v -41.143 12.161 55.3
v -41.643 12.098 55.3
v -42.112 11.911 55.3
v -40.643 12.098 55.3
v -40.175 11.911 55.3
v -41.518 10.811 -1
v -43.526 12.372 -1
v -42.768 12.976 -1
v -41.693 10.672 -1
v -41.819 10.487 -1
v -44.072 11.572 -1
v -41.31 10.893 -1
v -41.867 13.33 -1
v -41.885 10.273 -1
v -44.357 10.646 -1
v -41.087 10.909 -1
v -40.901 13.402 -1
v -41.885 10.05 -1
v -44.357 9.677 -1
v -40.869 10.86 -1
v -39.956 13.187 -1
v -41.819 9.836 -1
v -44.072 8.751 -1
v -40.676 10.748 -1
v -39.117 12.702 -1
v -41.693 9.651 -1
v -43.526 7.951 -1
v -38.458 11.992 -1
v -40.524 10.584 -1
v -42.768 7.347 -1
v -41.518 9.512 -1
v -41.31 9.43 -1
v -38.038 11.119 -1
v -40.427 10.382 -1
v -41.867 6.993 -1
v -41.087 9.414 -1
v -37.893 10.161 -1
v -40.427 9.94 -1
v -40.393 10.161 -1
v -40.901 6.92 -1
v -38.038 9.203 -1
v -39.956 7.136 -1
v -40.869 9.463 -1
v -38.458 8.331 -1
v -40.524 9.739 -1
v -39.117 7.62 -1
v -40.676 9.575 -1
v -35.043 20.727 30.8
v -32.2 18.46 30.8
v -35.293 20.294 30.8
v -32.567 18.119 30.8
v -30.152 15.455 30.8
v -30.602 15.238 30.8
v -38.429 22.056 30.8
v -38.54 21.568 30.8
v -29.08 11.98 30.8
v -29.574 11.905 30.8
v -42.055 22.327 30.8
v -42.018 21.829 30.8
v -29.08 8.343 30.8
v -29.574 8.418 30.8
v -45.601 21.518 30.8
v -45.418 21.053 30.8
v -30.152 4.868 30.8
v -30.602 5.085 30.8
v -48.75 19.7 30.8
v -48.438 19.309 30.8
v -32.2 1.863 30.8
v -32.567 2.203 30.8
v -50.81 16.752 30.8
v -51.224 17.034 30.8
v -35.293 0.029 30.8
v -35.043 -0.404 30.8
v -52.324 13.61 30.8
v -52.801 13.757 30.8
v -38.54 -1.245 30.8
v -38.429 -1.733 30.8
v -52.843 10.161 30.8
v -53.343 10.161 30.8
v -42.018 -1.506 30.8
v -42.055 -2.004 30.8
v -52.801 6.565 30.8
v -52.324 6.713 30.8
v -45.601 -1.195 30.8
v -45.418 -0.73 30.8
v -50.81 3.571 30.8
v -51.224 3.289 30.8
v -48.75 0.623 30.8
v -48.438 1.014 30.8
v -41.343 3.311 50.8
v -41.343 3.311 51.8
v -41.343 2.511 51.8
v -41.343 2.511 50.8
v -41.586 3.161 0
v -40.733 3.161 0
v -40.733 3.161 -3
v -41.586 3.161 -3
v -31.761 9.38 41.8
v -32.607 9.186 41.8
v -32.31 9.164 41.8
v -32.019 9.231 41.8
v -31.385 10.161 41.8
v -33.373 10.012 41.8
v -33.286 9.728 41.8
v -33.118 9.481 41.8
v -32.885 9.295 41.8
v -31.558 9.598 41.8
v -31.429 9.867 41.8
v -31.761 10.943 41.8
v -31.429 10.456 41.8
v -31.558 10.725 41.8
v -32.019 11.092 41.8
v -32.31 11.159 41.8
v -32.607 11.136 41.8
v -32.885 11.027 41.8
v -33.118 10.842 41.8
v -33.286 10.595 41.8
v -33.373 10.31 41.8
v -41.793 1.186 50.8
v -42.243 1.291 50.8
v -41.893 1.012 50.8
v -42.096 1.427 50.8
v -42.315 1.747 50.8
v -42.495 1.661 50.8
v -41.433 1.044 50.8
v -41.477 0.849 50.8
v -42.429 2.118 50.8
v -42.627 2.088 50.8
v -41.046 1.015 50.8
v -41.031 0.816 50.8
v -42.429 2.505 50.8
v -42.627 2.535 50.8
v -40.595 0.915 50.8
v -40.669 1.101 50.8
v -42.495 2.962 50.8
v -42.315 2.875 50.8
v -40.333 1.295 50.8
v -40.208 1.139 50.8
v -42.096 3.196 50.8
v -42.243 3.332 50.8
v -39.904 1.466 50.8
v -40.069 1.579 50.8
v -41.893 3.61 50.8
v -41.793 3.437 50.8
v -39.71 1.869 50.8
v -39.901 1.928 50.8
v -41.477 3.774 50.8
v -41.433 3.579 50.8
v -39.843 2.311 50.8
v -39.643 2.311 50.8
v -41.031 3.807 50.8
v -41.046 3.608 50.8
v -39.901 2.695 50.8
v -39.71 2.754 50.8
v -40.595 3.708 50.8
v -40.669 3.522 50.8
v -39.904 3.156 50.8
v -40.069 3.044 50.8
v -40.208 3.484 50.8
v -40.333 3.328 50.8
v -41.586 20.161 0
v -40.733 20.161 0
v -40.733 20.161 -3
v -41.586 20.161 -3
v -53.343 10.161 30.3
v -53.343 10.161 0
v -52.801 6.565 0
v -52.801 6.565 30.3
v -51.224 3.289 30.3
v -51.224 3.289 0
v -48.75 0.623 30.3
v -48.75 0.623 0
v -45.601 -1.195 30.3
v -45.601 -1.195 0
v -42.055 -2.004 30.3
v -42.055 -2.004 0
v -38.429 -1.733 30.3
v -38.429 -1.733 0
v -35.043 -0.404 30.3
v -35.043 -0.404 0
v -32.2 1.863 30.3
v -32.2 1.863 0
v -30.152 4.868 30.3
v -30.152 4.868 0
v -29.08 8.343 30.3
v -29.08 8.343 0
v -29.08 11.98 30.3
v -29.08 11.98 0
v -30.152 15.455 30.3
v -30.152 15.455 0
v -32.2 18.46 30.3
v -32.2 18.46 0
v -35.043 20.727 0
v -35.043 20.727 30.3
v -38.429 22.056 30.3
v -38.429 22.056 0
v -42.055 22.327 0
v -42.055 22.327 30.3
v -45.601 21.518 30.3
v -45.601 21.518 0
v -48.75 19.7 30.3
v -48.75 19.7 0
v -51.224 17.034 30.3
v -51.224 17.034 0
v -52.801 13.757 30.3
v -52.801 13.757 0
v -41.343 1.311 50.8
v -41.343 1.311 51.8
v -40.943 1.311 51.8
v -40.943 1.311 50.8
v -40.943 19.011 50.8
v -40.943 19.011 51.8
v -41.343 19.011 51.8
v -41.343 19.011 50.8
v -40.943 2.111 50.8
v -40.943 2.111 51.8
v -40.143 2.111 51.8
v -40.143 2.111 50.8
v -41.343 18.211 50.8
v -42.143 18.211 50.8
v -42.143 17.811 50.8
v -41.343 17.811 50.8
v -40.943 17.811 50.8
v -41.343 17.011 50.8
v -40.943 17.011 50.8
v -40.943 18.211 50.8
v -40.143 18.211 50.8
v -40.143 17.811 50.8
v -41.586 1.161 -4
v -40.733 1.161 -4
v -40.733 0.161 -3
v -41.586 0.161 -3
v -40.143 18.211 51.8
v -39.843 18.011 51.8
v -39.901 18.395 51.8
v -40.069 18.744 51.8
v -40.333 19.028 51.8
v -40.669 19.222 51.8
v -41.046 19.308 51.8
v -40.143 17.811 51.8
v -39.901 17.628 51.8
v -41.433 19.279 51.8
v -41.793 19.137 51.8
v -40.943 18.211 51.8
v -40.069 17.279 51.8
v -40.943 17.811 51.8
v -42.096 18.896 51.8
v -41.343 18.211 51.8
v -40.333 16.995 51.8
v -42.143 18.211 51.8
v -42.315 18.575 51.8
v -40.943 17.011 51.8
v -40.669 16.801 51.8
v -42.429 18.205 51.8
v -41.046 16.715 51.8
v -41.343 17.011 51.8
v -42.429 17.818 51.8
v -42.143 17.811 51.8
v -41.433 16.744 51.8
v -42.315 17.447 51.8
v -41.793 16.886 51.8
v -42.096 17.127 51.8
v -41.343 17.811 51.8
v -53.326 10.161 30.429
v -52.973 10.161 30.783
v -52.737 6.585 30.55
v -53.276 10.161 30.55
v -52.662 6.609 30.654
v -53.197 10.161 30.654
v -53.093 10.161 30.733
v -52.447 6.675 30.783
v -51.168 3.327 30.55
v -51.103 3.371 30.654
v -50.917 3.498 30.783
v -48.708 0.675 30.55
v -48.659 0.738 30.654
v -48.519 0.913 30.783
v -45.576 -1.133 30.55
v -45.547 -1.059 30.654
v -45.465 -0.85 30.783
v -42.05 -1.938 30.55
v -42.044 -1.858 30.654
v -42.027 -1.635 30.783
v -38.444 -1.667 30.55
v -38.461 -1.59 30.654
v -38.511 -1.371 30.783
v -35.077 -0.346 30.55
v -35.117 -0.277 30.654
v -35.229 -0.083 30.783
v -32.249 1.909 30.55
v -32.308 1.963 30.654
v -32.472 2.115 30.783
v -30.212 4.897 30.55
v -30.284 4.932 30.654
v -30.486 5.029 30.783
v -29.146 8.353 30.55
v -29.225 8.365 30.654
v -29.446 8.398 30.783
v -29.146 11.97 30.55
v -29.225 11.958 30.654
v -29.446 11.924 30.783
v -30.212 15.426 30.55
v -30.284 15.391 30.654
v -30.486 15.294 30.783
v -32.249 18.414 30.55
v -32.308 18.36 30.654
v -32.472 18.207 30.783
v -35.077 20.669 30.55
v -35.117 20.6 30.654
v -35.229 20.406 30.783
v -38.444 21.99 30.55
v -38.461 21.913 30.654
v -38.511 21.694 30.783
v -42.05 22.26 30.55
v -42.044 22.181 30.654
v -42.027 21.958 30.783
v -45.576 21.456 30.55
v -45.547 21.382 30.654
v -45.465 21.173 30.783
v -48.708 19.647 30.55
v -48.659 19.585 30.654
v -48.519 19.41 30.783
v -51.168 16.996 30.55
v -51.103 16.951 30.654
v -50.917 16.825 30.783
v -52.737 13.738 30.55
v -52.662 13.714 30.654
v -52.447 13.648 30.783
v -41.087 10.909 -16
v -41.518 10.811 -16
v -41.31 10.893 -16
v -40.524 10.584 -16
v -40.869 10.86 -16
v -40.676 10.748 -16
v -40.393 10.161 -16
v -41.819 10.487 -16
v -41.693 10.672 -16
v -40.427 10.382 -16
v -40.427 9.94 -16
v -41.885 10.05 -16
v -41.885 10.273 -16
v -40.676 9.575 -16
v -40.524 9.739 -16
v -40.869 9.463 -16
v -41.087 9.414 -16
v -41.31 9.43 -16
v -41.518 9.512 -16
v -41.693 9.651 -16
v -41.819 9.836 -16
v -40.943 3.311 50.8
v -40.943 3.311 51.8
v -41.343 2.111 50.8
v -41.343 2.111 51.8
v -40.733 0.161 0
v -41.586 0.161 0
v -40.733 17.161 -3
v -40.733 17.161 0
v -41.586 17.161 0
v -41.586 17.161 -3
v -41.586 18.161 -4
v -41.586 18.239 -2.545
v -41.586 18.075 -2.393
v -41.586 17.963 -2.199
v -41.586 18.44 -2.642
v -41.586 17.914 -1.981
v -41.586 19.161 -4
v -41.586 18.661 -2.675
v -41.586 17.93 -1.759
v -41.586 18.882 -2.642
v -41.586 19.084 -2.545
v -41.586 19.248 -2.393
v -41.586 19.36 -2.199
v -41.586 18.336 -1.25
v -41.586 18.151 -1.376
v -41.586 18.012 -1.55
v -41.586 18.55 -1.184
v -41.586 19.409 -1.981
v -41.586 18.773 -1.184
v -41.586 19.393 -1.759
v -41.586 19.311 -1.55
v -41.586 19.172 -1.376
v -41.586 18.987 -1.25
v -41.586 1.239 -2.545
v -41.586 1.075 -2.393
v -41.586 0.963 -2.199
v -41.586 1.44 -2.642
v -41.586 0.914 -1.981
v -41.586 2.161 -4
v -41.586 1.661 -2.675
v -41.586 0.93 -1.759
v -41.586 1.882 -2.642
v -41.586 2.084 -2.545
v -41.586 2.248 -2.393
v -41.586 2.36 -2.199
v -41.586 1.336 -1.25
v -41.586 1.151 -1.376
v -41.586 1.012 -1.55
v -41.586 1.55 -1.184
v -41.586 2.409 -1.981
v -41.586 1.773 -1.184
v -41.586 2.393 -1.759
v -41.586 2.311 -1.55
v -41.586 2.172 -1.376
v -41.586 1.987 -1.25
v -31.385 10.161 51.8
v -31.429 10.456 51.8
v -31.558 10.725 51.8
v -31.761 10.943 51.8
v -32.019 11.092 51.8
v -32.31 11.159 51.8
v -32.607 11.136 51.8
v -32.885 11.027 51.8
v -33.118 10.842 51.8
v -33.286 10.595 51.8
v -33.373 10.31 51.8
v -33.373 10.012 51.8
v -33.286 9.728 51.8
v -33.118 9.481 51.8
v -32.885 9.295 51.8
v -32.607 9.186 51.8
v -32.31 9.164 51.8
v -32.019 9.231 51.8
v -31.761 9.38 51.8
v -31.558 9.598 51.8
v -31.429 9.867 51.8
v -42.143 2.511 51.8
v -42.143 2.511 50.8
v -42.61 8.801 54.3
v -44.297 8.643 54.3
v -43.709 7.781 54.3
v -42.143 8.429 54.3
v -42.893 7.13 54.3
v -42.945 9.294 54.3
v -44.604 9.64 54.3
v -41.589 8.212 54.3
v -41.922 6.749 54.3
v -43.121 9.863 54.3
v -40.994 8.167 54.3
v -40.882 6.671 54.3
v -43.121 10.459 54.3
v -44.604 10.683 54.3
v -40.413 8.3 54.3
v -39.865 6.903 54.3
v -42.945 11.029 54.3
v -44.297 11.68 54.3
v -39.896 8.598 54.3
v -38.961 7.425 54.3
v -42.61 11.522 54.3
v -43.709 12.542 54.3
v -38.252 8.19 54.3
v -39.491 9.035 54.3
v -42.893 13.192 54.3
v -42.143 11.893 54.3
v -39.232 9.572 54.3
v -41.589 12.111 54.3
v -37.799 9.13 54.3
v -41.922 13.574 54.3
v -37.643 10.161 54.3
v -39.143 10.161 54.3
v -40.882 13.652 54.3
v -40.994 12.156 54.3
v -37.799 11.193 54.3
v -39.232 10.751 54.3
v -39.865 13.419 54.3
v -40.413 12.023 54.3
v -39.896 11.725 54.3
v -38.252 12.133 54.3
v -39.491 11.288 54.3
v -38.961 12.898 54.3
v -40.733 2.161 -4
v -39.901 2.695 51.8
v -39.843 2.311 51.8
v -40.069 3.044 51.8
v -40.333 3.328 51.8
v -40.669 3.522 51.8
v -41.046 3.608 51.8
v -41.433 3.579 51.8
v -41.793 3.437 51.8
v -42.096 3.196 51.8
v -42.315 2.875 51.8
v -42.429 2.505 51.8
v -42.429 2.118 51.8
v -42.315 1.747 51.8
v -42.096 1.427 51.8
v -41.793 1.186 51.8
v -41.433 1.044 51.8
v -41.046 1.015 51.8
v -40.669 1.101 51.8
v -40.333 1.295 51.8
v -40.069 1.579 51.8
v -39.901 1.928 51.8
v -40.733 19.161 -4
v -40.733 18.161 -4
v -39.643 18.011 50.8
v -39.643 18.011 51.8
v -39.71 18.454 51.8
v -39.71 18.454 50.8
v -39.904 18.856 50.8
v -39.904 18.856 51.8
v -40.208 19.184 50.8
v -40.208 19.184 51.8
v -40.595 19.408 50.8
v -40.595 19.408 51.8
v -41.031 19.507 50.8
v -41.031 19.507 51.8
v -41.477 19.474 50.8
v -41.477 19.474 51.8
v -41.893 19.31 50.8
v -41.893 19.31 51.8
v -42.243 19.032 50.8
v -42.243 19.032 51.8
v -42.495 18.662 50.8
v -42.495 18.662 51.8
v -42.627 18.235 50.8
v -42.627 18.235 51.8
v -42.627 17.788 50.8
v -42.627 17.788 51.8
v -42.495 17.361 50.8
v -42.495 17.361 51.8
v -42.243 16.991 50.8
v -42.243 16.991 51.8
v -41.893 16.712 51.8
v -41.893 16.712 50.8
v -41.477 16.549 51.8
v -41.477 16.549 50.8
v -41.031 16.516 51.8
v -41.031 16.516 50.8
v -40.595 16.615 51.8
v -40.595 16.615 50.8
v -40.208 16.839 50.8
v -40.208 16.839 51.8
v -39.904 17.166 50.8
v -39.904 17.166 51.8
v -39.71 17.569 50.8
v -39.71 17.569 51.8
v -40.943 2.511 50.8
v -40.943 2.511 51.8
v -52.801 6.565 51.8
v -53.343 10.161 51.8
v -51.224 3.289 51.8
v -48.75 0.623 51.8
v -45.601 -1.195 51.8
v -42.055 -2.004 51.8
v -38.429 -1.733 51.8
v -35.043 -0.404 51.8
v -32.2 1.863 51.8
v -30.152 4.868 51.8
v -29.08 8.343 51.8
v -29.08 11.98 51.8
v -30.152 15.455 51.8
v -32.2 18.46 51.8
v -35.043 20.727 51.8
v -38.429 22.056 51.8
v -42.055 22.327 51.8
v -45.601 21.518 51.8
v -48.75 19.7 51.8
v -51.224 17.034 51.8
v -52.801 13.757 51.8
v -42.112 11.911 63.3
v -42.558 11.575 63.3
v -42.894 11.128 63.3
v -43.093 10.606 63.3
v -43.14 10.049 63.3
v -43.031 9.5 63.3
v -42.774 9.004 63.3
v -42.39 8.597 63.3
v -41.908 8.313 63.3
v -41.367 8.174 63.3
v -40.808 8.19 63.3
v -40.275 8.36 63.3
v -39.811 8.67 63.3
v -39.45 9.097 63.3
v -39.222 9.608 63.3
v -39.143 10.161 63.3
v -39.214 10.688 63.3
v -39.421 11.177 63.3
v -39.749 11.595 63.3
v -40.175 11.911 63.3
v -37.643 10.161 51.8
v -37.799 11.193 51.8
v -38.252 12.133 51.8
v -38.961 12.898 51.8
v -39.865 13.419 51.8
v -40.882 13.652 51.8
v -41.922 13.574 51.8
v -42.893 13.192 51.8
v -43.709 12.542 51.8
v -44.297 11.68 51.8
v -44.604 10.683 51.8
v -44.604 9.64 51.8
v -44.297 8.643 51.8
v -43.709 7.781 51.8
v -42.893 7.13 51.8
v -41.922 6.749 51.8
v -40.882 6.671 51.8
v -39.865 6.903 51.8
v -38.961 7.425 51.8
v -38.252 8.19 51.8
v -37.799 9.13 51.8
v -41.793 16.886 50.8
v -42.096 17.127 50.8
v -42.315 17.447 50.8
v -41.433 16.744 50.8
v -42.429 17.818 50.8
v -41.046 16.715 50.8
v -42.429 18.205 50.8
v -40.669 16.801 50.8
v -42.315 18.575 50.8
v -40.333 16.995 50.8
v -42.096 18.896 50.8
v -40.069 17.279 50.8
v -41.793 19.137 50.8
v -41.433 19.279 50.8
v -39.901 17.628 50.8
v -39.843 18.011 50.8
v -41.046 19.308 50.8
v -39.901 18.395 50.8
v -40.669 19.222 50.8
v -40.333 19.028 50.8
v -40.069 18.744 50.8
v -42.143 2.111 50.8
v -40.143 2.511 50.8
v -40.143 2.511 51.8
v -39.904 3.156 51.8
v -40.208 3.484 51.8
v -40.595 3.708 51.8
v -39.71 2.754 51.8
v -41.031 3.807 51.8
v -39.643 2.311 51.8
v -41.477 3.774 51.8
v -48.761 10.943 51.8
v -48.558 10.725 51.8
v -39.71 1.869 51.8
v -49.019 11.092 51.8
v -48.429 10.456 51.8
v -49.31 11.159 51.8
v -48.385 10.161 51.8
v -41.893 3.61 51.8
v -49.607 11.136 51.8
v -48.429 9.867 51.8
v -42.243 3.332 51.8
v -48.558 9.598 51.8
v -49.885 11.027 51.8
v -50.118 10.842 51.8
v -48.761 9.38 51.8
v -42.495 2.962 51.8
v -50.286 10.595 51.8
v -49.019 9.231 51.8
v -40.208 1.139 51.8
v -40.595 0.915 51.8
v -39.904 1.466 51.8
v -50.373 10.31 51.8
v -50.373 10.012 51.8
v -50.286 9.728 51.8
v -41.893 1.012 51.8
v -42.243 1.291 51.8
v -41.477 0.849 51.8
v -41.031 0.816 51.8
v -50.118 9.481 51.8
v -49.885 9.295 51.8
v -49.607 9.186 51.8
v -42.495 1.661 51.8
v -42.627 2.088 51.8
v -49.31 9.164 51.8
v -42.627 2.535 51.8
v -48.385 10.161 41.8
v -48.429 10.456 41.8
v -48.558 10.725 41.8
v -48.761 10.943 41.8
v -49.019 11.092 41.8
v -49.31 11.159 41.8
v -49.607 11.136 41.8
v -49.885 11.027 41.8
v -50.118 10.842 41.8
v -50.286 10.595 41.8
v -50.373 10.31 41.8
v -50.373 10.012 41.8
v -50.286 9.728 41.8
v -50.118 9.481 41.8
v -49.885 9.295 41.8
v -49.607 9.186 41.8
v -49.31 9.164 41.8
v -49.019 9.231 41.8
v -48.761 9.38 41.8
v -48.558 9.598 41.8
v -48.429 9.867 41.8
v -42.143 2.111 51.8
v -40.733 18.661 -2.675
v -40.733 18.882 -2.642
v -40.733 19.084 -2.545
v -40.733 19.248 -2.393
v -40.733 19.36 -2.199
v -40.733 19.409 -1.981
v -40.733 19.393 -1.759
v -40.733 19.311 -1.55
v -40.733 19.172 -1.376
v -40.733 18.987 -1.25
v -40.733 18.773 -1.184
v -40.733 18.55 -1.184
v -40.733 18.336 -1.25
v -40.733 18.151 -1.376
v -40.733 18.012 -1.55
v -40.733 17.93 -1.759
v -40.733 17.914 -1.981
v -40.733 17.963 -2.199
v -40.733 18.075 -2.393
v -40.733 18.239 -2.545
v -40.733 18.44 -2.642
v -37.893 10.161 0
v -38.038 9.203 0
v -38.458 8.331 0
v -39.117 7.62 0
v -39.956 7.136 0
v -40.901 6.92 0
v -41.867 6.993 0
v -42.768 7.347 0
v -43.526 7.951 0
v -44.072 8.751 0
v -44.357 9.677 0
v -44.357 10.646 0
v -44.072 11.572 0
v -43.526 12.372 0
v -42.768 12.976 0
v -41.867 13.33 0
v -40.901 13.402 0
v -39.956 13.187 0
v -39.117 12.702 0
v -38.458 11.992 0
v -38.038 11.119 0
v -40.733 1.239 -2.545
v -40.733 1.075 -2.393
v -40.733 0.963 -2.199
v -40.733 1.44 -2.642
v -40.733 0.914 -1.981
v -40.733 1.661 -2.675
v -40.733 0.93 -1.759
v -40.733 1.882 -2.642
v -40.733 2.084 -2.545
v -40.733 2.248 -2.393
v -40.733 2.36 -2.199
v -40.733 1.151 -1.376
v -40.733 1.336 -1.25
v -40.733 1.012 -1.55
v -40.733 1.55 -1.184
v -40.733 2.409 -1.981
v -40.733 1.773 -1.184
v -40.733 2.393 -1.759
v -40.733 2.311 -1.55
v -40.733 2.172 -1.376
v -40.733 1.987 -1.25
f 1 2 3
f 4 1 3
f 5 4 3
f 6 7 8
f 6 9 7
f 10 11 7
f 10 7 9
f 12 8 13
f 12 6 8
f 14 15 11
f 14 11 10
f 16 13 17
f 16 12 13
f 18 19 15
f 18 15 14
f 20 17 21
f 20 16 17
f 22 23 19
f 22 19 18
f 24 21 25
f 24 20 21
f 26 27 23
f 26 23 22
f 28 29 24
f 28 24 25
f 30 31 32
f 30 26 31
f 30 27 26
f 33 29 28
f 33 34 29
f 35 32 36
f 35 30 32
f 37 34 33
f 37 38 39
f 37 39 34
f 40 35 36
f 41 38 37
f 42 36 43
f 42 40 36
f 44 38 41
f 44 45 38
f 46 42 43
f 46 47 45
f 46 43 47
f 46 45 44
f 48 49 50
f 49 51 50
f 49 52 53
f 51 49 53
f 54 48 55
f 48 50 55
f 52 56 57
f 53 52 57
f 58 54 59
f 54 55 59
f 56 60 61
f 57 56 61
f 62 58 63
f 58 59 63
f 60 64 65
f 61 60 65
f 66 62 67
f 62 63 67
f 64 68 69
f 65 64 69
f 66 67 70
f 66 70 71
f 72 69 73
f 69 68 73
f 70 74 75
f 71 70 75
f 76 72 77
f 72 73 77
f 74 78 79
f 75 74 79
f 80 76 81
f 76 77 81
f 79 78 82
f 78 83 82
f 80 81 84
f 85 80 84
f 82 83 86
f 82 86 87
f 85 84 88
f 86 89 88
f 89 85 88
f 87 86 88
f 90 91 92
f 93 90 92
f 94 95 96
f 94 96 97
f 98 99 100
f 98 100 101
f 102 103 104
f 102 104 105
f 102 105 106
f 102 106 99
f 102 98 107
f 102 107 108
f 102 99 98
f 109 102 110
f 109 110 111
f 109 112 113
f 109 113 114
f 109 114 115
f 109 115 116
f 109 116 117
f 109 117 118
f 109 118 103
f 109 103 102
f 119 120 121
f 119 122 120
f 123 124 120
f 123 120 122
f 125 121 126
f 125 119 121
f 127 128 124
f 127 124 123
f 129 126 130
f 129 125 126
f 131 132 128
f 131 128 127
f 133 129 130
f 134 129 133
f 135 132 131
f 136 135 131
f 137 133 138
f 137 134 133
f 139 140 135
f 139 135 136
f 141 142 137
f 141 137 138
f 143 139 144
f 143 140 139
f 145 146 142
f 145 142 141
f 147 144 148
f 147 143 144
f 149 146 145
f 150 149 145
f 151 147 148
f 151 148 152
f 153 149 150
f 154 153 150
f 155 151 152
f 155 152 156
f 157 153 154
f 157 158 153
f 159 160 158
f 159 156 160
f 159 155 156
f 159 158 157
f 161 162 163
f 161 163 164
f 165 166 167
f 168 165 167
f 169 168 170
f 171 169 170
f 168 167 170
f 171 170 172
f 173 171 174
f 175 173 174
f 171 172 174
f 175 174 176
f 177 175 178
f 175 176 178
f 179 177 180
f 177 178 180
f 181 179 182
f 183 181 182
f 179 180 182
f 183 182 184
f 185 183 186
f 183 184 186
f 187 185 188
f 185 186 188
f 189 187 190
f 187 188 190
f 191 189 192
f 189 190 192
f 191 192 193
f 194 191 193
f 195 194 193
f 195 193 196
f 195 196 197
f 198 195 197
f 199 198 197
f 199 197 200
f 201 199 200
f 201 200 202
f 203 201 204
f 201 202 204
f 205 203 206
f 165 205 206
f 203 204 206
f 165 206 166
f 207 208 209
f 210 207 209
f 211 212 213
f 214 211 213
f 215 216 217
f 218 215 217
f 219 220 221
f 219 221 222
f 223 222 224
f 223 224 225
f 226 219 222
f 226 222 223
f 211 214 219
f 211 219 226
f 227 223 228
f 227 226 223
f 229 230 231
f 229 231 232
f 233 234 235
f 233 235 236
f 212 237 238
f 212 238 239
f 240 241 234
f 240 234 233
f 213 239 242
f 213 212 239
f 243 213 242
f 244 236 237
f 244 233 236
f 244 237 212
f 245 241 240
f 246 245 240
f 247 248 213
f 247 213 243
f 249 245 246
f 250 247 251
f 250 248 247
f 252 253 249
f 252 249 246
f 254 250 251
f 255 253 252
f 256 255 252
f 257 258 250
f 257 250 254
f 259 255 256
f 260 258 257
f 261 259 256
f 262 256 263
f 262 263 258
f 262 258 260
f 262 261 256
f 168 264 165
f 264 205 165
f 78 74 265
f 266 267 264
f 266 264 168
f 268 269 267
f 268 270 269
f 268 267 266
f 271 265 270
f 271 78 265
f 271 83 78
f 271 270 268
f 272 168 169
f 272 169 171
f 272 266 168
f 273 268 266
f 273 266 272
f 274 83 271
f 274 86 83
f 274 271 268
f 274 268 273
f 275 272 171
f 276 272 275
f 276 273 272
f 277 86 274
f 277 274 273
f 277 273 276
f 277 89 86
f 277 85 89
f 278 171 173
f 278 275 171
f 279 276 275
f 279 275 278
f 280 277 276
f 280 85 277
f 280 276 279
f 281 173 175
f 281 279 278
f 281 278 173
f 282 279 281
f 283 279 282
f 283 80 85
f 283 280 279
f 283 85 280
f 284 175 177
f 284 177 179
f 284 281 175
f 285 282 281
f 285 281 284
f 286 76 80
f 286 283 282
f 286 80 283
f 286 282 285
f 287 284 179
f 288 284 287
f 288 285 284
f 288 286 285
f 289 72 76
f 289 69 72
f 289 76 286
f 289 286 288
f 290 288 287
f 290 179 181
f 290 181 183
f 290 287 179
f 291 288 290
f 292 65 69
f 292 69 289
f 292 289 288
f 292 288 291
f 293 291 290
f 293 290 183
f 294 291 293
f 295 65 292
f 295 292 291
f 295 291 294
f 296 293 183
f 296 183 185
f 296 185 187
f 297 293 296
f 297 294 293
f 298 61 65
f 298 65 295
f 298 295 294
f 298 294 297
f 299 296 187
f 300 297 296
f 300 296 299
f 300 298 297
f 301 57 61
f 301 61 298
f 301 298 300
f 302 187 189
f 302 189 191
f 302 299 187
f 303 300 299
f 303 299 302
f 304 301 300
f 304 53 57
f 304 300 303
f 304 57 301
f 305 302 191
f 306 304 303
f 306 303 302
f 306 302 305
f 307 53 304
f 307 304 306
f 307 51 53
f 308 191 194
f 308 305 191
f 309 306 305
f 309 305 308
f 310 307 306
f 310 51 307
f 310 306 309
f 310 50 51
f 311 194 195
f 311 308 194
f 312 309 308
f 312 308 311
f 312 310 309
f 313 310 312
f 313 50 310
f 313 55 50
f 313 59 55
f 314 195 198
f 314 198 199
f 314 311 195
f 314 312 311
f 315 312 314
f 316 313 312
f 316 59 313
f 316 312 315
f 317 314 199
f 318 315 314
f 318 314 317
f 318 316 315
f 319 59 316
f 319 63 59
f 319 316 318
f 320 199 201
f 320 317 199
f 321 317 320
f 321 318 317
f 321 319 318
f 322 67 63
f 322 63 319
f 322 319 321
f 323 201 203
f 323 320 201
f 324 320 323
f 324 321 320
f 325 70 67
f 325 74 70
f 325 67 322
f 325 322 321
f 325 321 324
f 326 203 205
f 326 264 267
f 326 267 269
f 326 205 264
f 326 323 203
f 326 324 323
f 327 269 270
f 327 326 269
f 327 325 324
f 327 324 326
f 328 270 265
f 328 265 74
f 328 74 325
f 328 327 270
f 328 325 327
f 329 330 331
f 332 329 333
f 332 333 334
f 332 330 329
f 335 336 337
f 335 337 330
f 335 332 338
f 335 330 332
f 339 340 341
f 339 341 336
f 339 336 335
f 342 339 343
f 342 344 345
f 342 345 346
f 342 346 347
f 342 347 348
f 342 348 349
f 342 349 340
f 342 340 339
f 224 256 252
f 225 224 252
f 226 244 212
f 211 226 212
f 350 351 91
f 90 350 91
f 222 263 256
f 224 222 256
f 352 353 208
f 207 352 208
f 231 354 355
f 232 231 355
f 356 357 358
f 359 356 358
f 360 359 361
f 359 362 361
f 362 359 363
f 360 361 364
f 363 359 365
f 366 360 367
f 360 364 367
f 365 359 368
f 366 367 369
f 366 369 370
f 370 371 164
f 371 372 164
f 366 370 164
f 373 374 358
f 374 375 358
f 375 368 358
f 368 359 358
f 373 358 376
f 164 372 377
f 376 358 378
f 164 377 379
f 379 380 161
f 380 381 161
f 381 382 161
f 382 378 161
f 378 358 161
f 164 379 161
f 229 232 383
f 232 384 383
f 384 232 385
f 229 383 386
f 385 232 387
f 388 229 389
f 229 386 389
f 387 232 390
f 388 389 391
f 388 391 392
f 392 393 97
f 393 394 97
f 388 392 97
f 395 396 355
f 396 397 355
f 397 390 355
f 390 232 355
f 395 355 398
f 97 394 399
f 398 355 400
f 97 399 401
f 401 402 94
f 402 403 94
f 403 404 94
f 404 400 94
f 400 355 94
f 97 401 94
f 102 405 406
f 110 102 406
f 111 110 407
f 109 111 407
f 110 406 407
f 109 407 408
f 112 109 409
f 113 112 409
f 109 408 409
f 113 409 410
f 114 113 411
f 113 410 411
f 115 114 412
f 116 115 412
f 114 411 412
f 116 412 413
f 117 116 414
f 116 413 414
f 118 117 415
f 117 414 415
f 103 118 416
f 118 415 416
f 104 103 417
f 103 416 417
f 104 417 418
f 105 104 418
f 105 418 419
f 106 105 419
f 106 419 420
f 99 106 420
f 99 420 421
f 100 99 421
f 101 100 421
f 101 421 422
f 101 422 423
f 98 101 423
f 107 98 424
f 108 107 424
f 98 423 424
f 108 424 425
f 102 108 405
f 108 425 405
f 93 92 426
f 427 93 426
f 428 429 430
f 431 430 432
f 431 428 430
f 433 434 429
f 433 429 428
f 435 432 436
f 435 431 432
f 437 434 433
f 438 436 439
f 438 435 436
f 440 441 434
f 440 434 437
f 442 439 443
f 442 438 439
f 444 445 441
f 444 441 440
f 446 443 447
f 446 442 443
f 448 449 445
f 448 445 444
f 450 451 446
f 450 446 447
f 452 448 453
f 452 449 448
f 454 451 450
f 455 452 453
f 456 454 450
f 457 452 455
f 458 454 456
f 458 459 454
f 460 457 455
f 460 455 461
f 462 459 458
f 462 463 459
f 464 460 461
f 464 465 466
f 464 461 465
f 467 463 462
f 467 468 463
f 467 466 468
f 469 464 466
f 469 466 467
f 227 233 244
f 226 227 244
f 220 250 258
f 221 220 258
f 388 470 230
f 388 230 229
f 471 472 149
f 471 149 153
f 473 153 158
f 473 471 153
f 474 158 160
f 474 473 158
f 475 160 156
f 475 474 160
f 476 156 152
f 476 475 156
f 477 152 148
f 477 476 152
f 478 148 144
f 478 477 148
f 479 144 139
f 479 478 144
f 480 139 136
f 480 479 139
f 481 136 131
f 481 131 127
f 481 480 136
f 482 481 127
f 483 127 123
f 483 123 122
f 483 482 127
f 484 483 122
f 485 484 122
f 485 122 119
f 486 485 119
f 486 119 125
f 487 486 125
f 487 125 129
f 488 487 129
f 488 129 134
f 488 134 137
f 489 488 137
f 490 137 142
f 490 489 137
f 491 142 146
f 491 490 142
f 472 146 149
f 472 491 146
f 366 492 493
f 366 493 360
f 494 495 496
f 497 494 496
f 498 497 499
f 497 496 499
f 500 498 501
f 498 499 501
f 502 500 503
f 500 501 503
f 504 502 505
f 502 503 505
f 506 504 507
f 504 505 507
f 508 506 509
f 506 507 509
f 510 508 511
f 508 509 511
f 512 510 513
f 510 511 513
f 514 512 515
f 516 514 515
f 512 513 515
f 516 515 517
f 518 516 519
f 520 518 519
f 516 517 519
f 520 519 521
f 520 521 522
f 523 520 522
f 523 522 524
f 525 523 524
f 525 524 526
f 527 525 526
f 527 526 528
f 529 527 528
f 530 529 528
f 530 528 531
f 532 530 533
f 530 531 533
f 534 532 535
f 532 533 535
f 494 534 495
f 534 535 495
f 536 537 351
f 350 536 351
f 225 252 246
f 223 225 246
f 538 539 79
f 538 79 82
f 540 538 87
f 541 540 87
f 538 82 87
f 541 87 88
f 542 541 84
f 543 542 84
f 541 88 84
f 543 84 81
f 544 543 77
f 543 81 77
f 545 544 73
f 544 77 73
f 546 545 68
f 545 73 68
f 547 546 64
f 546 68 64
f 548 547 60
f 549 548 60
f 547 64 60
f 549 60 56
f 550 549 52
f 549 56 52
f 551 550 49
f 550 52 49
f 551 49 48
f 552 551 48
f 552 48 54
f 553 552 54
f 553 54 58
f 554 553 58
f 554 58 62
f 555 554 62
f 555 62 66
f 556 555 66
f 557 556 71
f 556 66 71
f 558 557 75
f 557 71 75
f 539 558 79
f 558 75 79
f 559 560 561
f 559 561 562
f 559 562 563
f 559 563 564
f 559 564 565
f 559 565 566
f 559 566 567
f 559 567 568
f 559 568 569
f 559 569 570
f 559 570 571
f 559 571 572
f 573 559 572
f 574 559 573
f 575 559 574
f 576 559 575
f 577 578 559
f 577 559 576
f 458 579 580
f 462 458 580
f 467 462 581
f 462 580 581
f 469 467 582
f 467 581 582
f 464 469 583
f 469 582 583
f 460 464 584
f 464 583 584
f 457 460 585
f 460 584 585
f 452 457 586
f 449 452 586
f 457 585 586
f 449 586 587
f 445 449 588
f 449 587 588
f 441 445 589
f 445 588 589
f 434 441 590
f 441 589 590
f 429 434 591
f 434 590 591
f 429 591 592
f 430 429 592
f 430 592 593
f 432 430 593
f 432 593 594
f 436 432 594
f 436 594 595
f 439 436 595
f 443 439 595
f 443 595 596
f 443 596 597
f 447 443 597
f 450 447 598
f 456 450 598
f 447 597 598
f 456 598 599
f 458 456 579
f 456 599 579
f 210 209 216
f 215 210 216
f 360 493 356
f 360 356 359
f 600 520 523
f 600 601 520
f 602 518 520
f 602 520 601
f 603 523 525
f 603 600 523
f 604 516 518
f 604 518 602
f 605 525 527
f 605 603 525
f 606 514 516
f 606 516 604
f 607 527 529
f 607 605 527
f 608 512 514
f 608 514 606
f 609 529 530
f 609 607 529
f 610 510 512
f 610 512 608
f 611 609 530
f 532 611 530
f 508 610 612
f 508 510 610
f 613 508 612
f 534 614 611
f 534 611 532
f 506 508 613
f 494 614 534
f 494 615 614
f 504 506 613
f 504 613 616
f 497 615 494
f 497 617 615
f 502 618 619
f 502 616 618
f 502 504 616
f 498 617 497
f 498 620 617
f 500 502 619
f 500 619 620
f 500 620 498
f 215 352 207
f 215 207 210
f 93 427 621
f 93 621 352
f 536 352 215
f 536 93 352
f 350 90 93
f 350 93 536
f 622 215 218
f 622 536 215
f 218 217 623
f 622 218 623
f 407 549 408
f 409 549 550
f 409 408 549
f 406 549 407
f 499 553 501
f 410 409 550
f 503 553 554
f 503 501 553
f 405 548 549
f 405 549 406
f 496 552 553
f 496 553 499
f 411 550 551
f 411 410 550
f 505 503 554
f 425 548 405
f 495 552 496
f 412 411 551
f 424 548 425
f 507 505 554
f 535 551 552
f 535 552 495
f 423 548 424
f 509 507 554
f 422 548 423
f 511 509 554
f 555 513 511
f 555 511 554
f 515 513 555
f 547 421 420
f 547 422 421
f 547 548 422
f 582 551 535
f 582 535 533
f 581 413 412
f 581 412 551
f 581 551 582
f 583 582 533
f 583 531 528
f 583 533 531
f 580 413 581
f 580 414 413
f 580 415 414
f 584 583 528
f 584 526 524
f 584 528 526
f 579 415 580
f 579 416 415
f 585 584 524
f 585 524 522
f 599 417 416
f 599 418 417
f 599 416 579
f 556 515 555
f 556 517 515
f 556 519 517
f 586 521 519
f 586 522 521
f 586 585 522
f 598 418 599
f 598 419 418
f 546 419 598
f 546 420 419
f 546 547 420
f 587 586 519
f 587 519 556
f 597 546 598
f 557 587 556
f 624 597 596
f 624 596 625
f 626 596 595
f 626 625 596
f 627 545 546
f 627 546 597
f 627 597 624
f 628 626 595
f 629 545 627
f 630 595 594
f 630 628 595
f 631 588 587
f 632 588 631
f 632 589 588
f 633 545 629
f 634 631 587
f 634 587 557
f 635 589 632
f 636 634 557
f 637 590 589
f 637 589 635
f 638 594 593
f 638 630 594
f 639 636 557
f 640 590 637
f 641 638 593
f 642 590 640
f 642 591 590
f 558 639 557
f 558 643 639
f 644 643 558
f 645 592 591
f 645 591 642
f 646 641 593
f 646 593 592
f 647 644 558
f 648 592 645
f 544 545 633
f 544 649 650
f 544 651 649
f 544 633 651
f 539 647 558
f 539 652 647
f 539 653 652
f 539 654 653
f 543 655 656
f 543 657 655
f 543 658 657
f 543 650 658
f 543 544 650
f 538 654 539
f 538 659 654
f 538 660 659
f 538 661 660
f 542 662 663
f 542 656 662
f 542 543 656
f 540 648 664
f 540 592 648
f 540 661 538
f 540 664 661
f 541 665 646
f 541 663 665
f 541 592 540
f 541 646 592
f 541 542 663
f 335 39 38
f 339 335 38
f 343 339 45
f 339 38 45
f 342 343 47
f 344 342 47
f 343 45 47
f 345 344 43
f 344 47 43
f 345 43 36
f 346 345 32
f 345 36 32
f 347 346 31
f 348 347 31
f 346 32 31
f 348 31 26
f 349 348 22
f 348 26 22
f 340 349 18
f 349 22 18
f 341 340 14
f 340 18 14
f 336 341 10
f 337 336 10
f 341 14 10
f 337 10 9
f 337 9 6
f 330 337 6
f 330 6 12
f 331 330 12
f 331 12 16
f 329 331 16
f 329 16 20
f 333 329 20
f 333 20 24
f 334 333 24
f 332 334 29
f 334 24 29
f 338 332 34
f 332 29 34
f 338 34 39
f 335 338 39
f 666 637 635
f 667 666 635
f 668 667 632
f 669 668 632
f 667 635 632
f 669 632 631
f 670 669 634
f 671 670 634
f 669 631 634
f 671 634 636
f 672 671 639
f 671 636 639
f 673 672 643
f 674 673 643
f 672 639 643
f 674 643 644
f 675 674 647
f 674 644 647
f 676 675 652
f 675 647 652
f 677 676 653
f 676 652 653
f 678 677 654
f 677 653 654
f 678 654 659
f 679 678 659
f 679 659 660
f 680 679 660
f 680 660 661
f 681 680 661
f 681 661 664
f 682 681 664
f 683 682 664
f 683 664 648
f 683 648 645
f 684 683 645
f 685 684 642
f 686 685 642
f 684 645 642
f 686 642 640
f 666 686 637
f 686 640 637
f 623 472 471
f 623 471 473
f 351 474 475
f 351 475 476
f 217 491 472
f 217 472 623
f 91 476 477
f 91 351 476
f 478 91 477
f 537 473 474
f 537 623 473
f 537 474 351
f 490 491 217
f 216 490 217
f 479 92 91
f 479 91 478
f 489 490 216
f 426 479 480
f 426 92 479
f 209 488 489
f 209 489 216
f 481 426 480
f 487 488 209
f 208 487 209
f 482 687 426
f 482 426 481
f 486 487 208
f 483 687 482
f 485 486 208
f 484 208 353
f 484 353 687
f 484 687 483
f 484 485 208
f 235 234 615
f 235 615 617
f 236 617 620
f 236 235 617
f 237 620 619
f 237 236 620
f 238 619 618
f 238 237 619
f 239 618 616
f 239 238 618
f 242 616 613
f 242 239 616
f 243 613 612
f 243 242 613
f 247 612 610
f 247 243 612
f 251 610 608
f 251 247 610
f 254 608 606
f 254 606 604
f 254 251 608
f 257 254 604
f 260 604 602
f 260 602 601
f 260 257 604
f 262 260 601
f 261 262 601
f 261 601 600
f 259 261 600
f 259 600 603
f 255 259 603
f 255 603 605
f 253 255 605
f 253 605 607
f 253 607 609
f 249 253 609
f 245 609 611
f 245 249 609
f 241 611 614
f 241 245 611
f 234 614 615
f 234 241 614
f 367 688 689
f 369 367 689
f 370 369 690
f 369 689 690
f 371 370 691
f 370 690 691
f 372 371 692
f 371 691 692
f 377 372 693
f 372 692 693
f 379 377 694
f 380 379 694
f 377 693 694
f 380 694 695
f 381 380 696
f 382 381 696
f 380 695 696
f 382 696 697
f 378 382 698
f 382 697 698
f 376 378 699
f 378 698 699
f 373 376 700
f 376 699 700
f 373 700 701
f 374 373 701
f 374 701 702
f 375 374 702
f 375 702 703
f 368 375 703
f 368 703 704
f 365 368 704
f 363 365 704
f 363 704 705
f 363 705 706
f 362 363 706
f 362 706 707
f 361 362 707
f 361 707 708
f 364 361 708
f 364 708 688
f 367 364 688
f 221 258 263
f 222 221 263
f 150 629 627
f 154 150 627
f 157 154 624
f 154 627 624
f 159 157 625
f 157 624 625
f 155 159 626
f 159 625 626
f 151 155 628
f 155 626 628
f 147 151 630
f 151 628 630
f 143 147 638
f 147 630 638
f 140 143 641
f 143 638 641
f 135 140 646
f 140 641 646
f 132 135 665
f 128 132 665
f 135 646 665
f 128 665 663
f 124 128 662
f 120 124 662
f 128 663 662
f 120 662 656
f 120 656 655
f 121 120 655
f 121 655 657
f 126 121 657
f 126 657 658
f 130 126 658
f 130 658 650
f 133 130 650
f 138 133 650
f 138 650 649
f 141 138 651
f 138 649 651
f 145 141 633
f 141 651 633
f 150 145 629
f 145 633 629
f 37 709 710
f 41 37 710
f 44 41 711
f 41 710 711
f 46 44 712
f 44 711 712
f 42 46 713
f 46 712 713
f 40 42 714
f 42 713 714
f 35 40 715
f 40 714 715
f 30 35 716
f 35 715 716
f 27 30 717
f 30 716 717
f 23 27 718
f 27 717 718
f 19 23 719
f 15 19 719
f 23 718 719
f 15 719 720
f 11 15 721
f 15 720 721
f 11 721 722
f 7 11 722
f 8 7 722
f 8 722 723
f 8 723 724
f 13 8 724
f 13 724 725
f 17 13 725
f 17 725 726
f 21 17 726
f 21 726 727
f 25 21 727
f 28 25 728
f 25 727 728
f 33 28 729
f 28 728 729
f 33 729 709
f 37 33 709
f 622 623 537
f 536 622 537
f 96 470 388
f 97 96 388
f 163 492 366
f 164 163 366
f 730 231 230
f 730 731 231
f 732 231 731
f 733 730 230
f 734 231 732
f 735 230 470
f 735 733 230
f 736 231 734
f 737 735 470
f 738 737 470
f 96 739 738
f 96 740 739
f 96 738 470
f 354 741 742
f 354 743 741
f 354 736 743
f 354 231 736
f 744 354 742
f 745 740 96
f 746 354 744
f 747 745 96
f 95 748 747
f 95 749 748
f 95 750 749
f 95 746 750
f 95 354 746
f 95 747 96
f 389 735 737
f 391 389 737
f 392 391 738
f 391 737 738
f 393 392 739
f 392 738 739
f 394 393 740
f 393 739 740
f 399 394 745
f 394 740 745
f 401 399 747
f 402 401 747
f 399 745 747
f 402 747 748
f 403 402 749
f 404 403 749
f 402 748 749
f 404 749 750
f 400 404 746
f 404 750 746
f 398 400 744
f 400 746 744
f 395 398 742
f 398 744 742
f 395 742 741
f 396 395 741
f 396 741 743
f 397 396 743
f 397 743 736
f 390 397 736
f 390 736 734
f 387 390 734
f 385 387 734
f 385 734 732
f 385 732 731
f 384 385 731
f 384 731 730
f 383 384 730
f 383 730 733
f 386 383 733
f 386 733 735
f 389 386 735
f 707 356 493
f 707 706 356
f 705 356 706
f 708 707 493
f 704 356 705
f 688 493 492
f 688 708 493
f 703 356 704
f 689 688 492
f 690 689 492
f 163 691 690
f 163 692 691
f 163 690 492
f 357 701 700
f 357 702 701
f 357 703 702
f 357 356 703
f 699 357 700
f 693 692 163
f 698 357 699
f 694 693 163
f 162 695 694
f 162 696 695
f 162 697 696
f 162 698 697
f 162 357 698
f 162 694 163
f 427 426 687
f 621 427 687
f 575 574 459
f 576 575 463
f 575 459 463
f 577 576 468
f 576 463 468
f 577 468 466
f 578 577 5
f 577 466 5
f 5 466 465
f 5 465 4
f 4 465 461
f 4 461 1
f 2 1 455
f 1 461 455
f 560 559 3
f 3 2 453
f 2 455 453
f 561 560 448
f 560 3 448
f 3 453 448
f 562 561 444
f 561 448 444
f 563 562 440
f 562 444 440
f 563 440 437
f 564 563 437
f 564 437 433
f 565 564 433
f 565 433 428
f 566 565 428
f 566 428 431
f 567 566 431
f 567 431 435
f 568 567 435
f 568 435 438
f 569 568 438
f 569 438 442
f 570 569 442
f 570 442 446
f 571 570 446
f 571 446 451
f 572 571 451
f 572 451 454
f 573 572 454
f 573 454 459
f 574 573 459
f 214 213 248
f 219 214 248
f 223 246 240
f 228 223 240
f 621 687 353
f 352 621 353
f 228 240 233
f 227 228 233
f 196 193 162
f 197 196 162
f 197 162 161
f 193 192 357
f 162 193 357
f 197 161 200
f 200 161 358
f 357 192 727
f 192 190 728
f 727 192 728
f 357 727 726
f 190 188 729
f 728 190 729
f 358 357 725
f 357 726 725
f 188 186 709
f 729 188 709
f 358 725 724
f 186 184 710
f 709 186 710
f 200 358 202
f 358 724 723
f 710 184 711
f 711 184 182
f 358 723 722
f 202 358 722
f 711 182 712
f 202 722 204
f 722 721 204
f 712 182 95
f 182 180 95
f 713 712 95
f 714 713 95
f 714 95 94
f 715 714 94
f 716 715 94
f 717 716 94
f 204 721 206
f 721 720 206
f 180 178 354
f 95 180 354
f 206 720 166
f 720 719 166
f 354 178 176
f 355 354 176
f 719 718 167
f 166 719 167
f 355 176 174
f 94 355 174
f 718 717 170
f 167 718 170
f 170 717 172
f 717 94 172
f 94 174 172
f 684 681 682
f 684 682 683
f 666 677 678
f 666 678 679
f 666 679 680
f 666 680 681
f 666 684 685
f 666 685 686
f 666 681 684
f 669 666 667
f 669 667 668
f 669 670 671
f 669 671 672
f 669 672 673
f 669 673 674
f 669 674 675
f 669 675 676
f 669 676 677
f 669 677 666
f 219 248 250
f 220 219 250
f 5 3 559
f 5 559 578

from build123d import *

# Parameters (mm, degrees)
IZIM1_R                     = 12.2
Y_KSEKLIK_EKSTR_ZYON1_DEPTH = 30.8
RADYUS1_R                   = 0.5
IZIM2_R                     = 12.2
Y_KSEKLIK_EKSTR_ZYON2_DEPTH = 21
IZIM3_R                     = 3.5
Y_KSEKLIK_EKSTR_ZYON3_DEPTH = 2.5
IZIM4_R                     = 2
Y_KSEKLIK_EKSTR_ZYON4_DEPTH = 9
IZIM5_R                     = 1
KES_EKSTR_ZYON1_DEPTH       = 10
IZIM6_R                     = 1.5
IZIM6_R_2                   = 1.3
KES_EKSTR_ZYON2_DEPTH       = 1
KES_EKSTR_ZYON3_START       = -8
KES_EKSTR_ZYON3_DEPTH       = 8
IZIM9_R                     = 3.25
Y_KSEKLIK_EKSTR_ZYON5_DEPTH = 1
IZIM10_R                    = 0.75
Y_KSEKLIK_EKSTR_ZYON6_DEPTH = 15
IZIM11_W                    = 0.852537123
IZIM11_H                    = 3
Y_KSEKLIK_EKSTR_ZYON7_DEPTH = 4
IZIM12_R                    = 0.75
KES_EKSTR_ZYON4_DEPTH       = 4
PAH1_SIZE                   = 1


with BuildPart() as part:
    # Çizim1 → Yükseklik-Ekstrüzyon1 (new body)
    with BuildSketch(Plane.XY):
        with Locations((-41.143471688, 10.161406423)):
            Circle(IZIM1_R)
    extrude(amount=Y_KSEKLIK_EKSTR_ZYON1_DEPTH)

    # Radyus1
    radyus1_edges = [part.edges().sort_by_distance(p)[0] for p in [
        (-53.343471688, 10.161406423, 30.8),
    ]]
    fillet(radyus1_edges, radius=RADYUS1_R)

    # Çizim2 → Yükseklik-Ekstrüzyon2 (add)
    with BuildSketch(Plane.XY.offset(30.8)):
        with Locations((-41.143471688, 10.161406423)):
            Circle(IZIM2_R)
    extrude(amount=Y_KSEKLIK_EKSTR_ZYON2_DEPTH)

    # Çizim3 → Yükseklik-Ekstrüzyon3 (add)
    with BuildSketch(Plane.XY.offset(51.8)):
        with Locations((-41.143471688, 10.161406423)):
            Circle(IZIM3_R)
    extrude(amount=Y_KSEKLIK_EKSTR_ZYON3_DEPTH)

    # Çizim4 → Yükseklik-Ekstrüzyon4 (add)
    with BuildSketch(Plane.XY.offset(54.3)):
        with Locations((-41.143471688, 10.161406423)):
            Circle(IZIM4_R)
    extrude(amount=Y_KSEKLIK_EKSTR_ZYON4_DEPTH)

    # Çizim5 → Kes-Ekstrüzyon1 (cut)
    with BuildSketch(Plane.XY.offset(51.8)):
        with Locations((-49.384663885, 10.161406423)):
            Circle(IZIM5_R)
        with Locations((-32.384663885, 10.161406423)):
            Circle(IZIM5_R)
    extrude(amount=-KES_EKSTR_ZYON1_DEPTH, mode=Mode.SUBTRACT)

    # Çizim6 → Kes-Ekstrüzyon2 (cut)
    # profile 1 of 4: a face of its own
    with BuildSketch(Plane.XY.offset(51.8)):
        with Locations((-41.143471688, 2.311406423)):
            Circle(IZIM6_R)
        with Locations((-41.143471688, 2.311406423)):
            Circle(IZIM6_R_2, mode=Mode.SUBTRACT)
    # profile 2 of 4: a face of its own
    with BuildSketch(Plane.XY.offset(51.8)):
        Polygon((-40.943471688, 3.311406423), (-41.343471688, 3.311406423), (-41.343471688, 2.511406423), (-42.143471688, 2.511406423), (-42.143471688, 2.111406423), (-41.343471688, 2.111406423), (-41.343471688, 1.311406423), (-40.943471688, 1.311406423), (-40.943471688, 2.111406423), (-40.143471688, 2.111406423), (-40.143471688, 2.511406423), (-40.943471688, 2.511406423), align=None)
    # profile 3 of 4: a face of its own
    with BuildSketch(Plane.XY.offset(51.8)):
        with Locations((-41.143471688, 18.011406423)):
            Circle(IZIM6_R)
        with Locations((-41.143471688, 18.011406423)):
            Circle(IZIM6_R_2, mode=Mode.SUBTRACT)
    # profile 4 of 4: a face of its own
    with BuildSketch(Plane.XY.offset(51.8)):
        Polygon((-41.343471688, 17.011406423), (-40.943471688, 17.011406423), (-40.943471688, 17.811406423), (-40.143471688, 17.811406423), (-40.143471688, 18.211406423), (-40.943471688, 18.211406423), (-40.943471688, 19.011406423), (-41.343471688, 19.011406423), (-41.343471688, 18.211406423), (-42.143471688, 18.211406423), (-42.143471688, 17.811406423), (-41.343471688, 17.811406423), align=None)
    extrude(amount=-KES_EKSTR_ZYON2_DEPTH, mode=Mode.SUBTRACT)

    # Çizim8 → Kes-Ekstrüzyon3 (cut)
    with BuildSketch(Plane.XY.offset(63.3).offset(KES_EKSTR_ZYON3_START)):
        with BuildLine():
            Line((-42.111717524, 11.911406423), (-40.175225851, 11.911406423))
            ThreePointArc((-40.175225851, 11.911406423), (-41.143471688, 12.161406423), (-42.111717524, 11.911406423))
        make_face()
    extrude(amount=KES_EKSTR_ZYON3_DEPTH, mode=Mode.SUBTRACT)

    # Çizim9 → Yükseklik-Ekstrüzyon5 (add)
    with BuildSketch(Plane(origin=(0, 0, 0), x_dir=(-1, 0, 0), z_dir=(0, 0, -1))):
        with Locations((41.143471688, 10.161406423)):
            Circle(IZIM9_R)
    extrude(amount=Y_KSEKLIK_EKSTR_ZYON5_DEPTH)

    # Çizim10 → Yükseklik-Ekstrüzyon6 (add)
    with BuildSketch(Plane(origin=(0, 0, -1), x_dir=(-1, 0, 0), z_dir=(0, 0, -1))):
        with Locations((41.143471688, 10.161406423)):
            Circle(IZIM10_R)
    extrude(amount=Y_KSEKLIK_EKSTR_ZYON6_DEPTH)

    # Çizim11 → Yükseklik-Ekstrüzyon7 (add)
    with BuildSketch(Plane(origin=(0, 0, 0), x_dir=(-1, 0, 0), z_dir=(0, 0, -1))):
        with Locations((41.159259413, 18.661406423)):
            Rectangle(IZIM11_W, IZIM11_H)
        with Locations((41.159259413, 1.661406423)):
            Rectangle(IZIM11_W, IZIM11_H)
    extrude(amount=Y_KSEKLIK_EKSTR_ZYON7_DEPTH)

    # Çizim12 → Kes-Ekstrüzyon4 (cut)
    with BuildSketch(Plane(origin=(-40.732990851, 0, 0), x_dir=(0, 0, -1), z_dir=(1, 0, 0))):
        with Locations((1.925401768, 18.661406423)):
            Circle(IZIM12_R)
        with Locations((1.925401768, 1.661406423)):
            Circle(IZIM12_R)
    extrude(amount=-KES_EKSTR_ZYON4_DEPTH, mode=Mode.SUBTRACT)

    # Pah1
    pah1_edges = [part.edges().sort_by_distance(p)[0] for p in [
        (-41.159259412, 0.161406423, -4),
        (-41.159259412, 3.161406423, -4),
        (-41.159259412, 20.161406423, -4),
        (-41.159259412, 17.161406423, -4),
    ]]
    chamfer(pah1_edges, length=PAH1_SIZE)


solid = part.part
